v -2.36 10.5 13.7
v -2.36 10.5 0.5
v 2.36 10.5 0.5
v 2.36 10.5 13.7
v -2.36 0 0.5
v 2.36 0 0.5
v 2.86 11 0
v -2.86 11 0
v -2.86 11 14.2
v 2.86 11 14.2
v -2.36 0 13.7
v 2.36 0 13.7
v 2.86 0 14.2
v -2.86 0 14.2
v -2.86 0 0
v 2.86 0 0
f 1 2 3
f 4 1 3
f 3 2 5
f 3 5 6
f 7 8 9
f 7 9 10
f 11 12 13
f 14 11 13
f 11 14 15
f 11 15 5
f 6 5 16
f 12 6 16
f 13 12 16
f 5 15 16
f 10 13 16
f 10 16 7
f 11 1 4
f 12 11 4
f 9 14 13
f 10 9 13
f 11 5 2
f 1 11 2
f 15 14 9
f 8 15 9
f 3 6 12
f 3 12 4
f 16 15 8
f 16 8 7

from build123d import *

# Parameters (mm, degrees)
CUBE001_W     = 4.72
CUBE001_H     = 11
CUBE001_DEPTH = 13.2
CUBE_W        = 5.72
CUBE_H        = 11
CUBE_DEPTH    = 14.2


with BuildPart() as cube001:
    # cube001 → cube001 (new body)
    with BuildSketch(Plane(origin=(0.5, -0.5, 0.5), x_dir=(1, 0, 0), z_dir=(0, 0, 1))):
        with Locations((2.36, 5.5)):
            Rectangle(CUBE001_W, CUBE001_H)
    extrude(amount=CUBE001_DEPTH)


with BuildPart() as difference:
    # cube → cube (new body)
    with BuildSketch(Plane.XY):
        with Locations((2.86, 5.5)):
            Rectangle(CUBE_W, CUBE_H)
    extrude(amount=CUBE_DEPTH)

    # difference: cut cube001
    add(cube001.part, mode=Mode.SUBTRACT)


with BuildPart() as difference_1:
    # difference placement: moved
    add(difference.part.moved(Location((-2.86, 0, 0))))


solid = difference_1.part
